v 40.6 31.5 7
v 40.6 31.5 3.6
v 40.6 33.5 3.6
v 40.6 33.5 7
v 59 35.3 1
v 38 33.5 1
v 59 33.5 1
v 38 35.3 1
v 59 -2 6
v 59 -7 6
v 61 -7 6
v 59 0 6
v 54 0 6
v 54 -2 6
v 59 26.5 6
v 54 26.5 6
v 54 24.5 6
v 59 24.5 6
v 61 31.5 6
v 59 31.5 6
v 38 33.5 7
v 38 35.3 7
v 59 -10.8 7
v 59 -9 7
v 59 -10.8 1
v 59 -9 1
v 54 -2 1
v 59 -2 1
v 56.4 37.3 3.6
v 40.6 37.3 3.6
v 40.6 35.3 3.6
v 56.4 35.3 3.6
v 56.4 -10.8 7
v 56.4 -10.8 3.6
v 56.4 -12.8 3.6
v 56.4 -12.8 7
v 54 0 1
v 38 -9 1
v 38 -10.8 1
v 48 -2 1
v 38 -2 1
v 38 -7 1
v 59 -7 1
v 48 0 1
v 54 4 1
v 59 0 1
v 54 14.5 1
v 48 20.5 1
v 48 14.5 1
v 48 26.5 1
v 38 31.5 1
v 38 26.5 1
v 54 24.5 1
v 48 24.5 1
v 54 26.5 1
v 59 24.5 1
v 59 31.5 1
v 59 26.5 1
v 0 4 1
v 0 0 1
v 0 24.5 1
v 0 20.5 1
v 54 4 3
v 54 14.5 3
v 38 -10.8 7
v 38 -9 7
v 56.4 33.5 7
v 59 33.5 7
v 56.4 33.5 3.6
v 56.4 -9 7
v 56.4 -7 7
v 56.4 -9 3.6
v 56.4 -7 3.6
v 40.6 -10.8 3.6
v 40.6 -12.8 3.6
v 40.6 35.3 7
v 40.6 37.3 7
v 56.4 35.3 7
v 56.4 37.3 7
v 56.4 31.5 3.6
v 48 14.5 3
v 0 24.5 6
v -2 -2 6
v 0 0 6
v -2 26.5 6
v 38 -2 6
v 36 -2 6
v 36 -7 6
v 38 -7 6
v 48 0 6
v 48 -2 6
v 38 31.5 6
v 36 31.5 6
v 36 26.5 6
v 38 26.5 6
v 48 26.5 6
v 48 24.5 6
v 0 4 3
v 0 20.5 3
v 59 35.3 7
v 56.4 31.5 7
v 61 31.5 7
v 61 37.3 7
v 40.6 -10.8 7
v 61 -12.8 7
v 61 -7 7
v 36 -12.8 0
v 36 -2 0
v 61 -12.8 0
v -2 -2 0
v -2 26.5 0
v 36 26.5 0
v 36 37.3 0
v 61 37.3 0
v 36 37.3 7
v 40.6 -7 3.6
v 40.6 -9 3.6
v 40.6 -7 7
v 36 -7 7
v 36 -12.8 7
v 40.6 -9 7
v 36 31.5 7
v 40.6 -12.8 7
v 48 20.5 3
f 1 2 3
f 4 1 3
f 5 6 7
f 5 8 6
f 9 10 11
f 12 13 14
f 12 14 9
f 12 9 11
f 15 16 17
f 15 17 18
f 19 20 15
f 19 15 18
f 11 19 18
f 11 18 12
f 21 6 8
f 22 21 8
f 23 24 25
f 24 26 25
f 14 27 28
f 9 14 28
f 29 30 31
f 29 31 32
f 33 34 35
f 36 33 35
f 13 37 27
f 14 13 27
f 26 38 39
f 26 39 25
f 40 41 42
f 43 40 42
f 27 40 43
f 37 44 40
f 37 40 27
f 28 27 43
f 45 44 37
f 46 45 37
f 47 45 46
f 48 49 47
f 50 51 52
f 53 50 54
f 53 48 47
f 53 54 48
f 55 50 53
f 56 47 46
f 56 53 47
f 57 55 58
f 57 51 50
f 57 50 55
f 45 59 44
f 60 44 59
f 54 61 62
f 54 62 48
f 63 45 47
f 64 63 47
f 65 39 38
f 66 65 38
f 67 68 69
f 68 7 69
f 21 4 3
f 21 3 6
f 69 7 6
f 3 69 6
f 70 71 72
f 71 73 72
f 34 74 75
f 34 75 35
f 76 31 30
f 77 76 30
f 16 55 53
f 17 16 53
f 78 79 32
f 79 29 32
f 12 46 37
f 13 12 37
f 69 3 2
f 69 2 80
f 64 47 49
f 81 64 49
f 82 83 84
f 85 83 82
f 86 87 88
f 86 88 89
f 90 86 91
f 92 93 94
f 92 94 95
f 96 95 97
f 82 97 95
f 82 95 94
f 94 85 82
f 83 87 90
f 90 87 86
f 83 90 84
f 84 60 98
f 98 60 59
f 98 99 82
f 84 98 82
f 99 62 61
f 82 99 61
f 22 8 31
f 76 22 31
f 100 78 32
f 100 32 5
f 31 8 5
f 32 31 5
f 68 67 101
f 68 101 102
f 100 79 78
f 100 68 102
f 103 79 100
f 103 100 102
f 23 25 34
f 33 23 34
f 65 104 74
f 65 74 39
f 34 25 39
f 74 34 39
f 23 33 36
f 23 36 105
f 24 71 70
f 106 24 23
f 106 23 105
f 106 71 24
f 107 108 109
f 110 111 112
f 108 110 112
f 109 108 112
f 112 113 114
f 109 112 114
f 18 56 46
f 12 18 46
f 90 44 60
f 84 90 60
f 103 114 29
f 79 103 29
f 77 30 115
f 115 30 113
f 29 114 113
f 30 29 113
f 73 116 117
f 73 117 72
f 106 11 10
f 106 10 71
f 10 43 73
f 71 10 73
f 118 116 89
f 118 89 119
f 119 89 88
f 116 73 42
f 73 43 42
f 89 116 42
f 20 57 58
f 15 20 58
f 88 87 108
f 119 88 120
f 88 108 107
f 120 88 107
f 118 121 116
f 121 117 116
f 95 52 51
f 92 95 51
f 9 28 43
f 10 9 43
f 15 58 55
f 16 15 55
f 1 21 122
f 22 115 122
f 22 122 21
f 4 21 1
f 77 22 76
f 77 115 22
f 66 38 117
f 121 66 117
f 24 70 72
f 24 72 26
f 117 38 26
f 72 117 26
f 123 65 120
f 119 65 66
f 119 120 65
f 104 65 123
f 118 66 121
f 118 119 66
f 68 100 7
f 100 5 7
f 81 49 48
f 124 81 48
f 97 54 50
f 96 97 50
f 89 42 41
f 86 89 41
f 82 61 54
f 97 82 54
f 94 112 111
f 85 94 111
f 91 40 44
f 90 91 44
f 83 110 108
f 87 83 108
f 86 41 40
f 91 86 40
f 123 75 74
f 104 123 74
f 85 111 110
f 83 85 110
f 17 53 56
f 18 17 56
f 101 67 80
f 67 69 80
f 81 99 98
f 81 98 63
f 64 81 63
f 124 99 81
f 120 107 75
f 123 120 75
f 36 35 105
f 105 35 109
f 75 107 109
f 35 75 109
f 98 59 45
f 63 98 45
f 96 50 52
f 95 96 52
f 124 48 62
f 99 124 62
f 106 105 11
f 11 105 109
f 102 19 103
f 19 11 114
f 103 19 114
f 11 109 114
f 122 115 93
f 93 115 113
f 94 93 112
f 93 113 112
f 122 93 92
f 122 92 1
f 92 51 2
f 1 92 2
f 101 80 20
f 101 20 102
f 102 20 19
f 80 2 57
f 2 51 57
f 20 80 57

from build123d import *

# Parameters (mm, degrees)
F1_DEPTH = 3
F2_DEPTH = 1
F3_DEPTH = 6
F0_W     = 15.8
F0_H     = 2
F4_DEPTH = 3.6
F7_DEPTH = 1


with BuildPart() as f1:
    # F0 (on Top) → F1 (new body)
    with BuildSketch(Plane.XY):
        Polygon((48, 20.5), (0, 20.5), (0, 4), (54, 4), (54, 14.5), (48, 14.5), align=None)
    extrude(amount=F1_DEPTH)

    # F0 (on Top) → F2 (join)
    with BuildSketch(Plane.XY):
        Polygon((0, 24.5), (0, 20.5), (48, 20.5), (48, 14.5), (54, 14.5), (54, 4), (0, 4), (0, 0), (48, 0), (48, -2), (38, -2), (38, -7), (40.6, -7), (56.4, -7), (59, -7), (59, -2), (54, -2), (54, 0), (59, 0), (59, 24.5), (54, 24.5), (54, 26.5), (59, 26.5), (59, 31.5), (56.4, 31.5), (40.6, 31.5), (38, 31.5), (38, 26.5), (48, 26.5), (48, 24.5), align=None)
        Polygon((38, 33.5), (40.6, 33.5), (56.4, 33.5), (59, 33.5), (59, 35.3), (56.4, 35.3), (40.6, 35.3), (38, 35.3), align=None)
        Polygon((56.4, -9), (40.6, -9), (38, -9), (38, -10.8), (40.6, -10.8), (56.4, -10.8), (59, -10.8), (59, -9), align=None)
    extrude(amount=F2_DEPTH)

    # F0 (on Top) → F3 (join)
    with BuildSketch(Plane.XY):
        Polygon((0, 4), (0, 20.5), (0, 24.5), (48, 24.5), (48, 26.5), (38, 26.5), (36, 26.5), (-2, 26.5), (-2, -2), (36, -2), (38, -2), (48, -2), (48, 0), (0, 0), align=None)
        Polygon((36, 26.5), (38, 26.5), (38, 31.5), (40.6, 31.5), (40.6, 33.5), (38, 33.5), (38, 35.3), (40.6, 35.3), (40.6, 37.3), (36, 37.3), align=None)
        Polygon((56.4, 33.5), (56.4, 31.5), (59, 31.5), (59, 26.5), (61, 26.5), (61, 37.3), (56.4, 37.3), (56.4, 35.3), (59, 35.3), (59, 33.5), align=None)
        Polygon((61, 26.5), (59, 26.5), (54, 26.5), (54, 24.5), (59, 24.5), (59, 0), (54, 0), (54, -2), (59, -2), (61, -2), align=None)
        Polygon((59, -7), (56.4, -7), (56.4, -9), (59, -9), (59, -10.8), (56.4, -10.8), (56.4, -12.8), (61, -12.8), (61, -2), (59, -2), align=None)
        Polygon((38, -7), (38, -2), (36, -2), (36, -12.8), (40.6, -12.8), (40.6, -10.8), (38, -10.8), (38, -9), (40.6, -9), (40.6, -7), align=None)
    extrude(amount=F3_DEPTH)

    # F0 (on Top) → F4 (join)
    with BuildSketch(Plane.XY):
        with Locations((48.5, 36.3)):
            Rectangle(F0_W, F0_H)
        with Locations((48.5, 32.5)):
            Rectangle(F0_W, F0_H)
        with Locations((48.5, -8)):
            Rectangle(F0_W, F0_H)
        with Locations((48.5, -11.8)):
            Rectangle(F0_W, F0_H)
    extrude(amount=F4_DEPTH)

    # F6 (on face) + F5 (on face) → F7 (join)
    with BuildSketch(Plane.XY.offset(6)):
        Polygon((61, 37.3), (56.4, 37.3), (56.4, 35.3), (59, 35.3), (59, 33.5), (56.4, 33.5), (56.4, 31.5), (61, 31.5), align=None)
        Polygon((61, -7), (56.4, -7), (56.4, -9), (59, -9), (59, -10.8), (56.4, -10.8), (56.4, -12.8), (61, -12.8), align=None)
    with BuildSketch(Plane.XY.offset(6)):
        Polygon((40.6, 37.3), (36, 37.3), (36, 31.5), (38, 31.5), (40.6, 31.5), (40.6, 33.5), (38, 33.5), (38, 35.3), (40.6, 35.3), align=None)
        Polygon((38, -7), (36, -7), (36, -12.8), (40.6, -12.8), (40.6, -10.8), (38, -10.8), (38, -9), (40.6, -9), (40.6, -7), align=None)
    extrude(amount=F7_DEPTH)


solid = f1.part
